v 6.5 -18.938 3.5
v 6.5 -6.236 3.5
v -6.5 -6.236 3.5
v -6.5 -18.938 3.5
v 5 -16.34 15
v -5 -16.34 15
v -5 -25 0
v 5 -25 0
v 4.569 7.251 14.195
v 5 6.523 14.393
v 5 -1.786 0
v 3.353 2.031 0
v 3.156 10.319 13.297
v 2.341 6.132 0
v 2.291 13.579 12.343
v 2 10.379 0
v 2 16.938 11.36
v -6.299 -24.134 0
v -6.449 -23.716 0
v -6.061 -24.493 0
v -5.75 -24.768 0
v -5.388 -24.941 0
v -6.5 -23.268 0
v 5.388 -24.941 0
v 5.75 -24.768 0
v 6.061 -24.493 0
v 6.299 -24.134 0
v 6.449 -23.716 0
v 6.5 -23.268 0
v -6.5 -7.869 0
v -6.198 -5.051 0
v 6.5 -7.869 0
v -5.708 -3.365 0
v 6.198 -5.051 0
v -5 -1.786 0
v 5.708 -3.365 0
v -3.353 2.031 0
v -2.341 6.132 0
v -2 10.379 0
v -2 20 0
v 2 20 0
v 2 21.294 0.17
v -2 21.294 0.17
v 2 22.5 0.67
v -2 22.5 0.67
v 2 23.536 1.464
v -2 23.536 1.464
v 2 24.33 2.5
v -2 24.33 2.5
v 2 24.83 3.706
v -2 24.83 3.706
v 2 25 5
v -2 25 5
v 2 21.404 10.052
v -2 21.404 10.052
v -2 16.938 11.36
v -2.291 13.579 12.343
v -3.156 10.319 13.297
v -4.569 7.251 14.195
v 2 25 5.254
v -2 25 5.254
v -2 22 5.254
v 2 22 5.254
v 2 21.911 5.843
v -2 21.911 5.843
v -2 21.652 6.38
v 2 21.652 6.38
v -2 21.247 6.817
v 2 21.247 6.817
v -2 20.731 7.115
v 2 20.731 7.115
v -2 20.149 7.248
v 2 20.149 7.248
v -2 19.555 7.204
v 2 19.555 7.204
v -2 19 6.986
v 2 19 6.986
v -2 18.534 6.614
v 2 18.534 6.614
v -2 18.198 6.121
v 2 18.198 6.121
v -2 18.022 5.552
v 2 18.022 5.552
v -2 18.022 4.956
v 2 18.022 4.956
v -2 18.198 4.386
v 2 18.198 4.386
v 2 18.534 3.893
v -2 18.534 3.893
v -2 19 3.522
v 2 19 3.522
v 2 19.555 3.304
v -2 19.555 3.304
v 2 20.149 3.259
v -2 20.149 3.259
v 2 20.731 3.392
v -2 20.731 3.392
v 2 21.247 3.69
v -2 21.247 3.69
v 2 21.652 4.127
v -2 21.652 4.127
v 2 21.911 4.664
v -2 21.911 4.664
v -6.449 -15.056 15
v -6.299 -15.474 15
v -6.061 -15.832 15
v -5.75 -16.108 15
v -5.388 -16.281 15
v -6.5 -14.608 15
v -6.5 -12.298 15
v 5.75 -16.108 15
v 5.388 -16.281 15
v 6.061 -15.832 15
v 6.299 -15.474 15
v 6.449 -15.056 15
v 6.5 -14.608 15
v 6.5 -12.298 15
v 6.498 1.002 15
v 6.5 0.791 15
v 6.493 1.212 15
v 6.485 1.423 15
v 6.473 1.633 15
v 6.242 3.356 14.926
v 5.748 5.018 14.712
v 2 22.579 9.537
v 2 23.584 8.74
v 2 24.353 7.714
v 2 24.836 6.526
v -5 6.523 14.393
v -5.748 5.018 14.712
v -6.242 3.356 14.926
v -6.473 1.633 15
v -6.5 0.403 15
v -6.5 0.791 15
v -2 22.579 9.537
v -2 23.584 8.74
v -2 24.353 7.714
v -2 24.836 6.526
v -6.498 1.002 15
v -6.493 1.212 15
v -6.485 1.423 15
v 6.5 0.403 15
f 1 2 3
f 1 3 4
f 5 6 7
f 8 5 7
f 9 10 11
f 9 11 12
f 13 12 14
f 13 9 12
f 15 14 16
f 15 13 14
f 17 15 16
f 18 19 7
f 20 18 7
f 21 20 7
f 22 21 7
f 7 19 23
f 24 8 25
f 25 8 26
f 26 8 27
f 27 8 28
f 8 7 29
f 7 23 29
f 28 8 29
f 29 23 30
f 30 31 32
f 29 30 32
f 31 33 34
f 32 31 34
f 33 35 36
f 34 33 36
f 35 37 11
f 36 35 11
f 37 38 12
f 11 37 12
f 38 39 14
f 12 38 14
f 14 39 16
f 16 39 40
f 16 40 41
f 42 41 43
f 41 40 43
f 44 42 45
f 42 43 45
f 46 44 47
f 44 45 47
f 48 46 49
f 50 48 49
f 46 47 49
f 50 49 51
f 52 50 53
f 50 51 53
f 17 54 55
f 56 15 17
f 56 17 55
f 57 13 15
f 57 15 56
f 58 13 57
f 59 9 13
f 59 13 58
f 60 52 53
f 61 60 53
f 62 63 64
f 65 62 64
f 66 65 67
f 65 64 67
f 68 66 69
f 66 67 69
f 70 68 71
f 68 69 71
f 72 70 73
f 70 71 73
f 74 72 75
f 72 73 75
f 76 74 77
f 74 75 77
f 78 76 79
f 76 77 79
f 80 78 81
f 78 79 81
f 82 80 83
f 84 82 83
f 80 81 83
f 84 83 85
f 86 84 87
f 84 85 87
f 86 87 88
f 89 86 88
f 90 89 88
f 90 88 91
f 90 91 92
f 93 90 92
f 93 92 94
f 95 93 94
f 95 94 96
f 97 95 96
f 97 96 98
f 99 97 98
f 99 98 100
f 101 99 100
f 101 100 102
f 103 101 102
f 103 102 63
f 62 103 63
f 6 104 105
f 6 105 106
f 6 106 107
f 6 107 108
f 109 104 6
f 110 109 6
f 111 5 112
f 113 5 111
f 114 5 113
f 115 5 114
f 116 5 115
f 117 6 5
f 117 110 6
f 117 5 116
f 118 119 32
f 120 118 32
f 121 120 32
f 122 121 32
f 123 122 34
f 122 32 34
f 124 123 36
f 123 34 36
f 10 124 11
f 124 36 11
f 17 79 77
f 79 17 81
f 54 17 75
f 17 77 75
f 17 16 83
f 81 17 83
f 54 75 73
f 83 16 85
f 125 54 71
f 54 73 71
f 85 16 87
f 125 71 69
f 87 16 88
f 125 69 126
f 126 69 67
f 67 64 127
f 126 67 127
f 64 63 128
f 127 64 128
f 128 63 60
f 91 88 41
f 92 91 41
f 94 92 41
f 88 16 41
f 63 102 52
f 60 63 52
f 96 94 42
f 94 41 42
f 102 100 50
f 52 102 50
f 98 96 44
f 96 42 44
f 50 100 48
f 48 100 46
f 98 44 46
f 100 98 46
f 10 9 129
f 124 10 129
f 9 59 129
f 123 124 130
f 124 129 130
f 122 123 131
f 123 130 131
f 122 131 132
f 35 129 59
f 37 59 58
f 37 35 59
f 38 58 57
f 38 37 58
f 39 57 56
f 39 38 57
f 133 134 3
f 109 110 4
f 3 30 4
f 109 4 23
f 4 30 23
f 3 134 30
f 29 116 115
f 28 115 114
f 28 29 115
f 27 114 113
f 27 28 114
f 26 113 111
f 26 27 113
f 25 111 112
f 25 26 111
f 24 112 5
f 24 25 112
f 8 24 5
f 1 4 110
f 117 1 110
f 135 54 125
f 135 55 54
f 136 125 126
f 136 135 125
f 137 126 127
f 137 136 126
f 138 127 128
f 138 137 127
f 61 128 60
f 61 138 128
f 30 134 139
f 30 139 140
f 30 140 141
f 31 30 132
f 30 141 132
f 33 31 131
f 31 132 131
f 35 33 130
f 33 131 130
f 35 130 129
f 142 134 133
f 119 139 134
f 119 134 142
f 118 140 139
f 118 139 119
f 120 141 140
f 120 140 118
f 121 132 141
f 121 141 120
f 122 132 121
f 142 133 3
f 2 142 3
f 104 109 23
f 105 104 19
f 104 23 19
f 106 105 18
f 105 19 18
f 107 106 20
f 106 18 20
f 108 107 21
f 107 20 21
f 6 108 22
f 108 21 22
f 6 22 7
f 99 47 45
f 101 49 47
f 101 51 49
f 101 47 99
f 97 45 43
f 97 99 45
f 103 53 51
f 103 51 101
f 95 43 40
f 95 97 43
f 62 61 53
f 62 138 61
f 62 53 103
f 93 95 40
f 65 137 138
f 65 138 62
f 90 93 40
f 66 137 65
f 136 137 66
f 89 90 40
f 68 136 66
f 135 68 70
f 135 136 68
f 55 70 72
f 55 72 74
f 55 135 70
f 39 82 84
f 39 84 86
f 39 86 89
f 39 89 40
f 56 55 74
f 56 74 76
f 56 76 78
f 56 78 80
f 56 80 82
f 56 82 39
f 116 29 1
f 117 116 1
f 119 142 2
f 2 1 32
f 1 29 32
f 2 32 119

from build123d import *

# Parameters (mm, degrees)
F1_DEPTH     = 15
F3_DEPTH     = 25
F4_DEPTH     = 4.5
F6_DEPTH     = 4.5
F7_T4_DEPTH  = 80.5166313745
F7_T10_DEPTH = 80.5166313745
F8_SIZE2     = 20.5
F8_SIZE      = 6
F9_R         = 1.5
F10_R        = 10
F11_R        = 20
F12_R        = 5
F13_R        = 2
F14_DEPTH    = 25


# Not quite as in the source:
# - a fillet or chamfer that OpenCascade refuses, or shapes differently, is made with other operations: its cross-section is extruded or revolved along the edge and cut away or added


with BuildPart() as f1:
    # F0 (on Top) → F1 (new body)
    with BuildSketch(Plane.XY):
        Polygon((-6.5, 12), (-6.5, -25), (6.5, -25), (6.5, 12), (2, 12), (2, 25), (-2, 25), (-2, 12), align=None)
    extrude(amount=F1_DEPTH)

    # F2 (on face) → F3 (cut)
    with BuildSketch(Plane(origin=(-6.5, 0, 0), x_dir=(0, -1, 0), z_dir=(-1, 0, 0))):
        Polygon((6.2361162513, 3.5), (18.9378221735, 3.5), (12.2982940778, 15), (-0.4034118443, 15), align=None)
        Polygon((25, 15), (16.3397459622, 15), (25, 0), align=None)
    extrude(amount=-F3_DEPTH, mode=Mode.SUBTRACT)

    # F2 (on face) → F4 (cut)
    with BuildSketch(Plane(origin=(-6.5, 0, 0), x_dir=(0, -1, 0), z_dir=(-1, 0, 0))):
        Polygon((4.2153903092, 0), (2.194664367, 3.5), (-4.4448637287, 15), (-12, 15), (-12, 0), align=None)
    extrude(amount=-F4_DEPTH, mode=Mode.SUBTRACT)

    # F5 (on face) → F6 (cut)
    with BuildSketch(Plane.YZ.offset(6.5)):
        Polygon((12, 15), (4.4448637287, 15), (-4.2153903092, 0), (12, 0), align=None)
    extrude(amount=-F6_DEPTH, mode=Mode.SUBTRACT)

    # F7: fillet of radius 20 on 2 edges, made by hand


with BuildPart() as f7_tool2:
    # F7_s3 → F7_t4 (new body)
    with BuildSketch(Plane(origin=(0, -16.852878402, -29.190041646), x_dir=(1, 0, 0), z_dir=(0, 0.5, 0.8660254038))):
        with BuildLine():
            ThreePointArc((-6.5, -3.6506350946), (-3.1585563186, 2.2803856327), (-2, 8.9885895652))
            Line((-2, 8.9885895652), (-2, -3.6506350946))
            Line((-2, -3.6506350946), (-6.5, -3.6506350946))
        make_face()
    extrude(amount=F7_T4_DEPTH)

    split(bisect_by=Plane.XY.offset(15), keep=Keep.BOTTOM)

    split(bisect_by=Plane.XY, keep=Keep.TOP)


with BuildPart() as f1_1:
    add(f1.part)

    # F7_t1: union F7_tool2
    add(f7_tool2.part)


with BuildPart() as f7_tool8:
    # F7_s9 → F7_t10 (new body)
    with BuildSketch(Plane(origin=(0, 23.4054372853, 40.5394065514), x_dir=(1, 0, 0), z_dir=(0, -0.5, -0.8660254038))):
        with BuildLine():
            ThreePointArc((6.5, 3.6506350946), (3.1585563186, -2.2803856327), (2, -8.9885895652))
            Line((2, -8.9885895652), (2, 3.6506350946))
            Line((2, 3.6506350946), (6.5, 3.6506350946))
        make_face()
    extrude(amount=F7_T10_DEPTH)

    split(bisect_by=Plane.XY, keep=Keep.TOP)

    split(bisect_by=Plane.XY.offset(15), keep=Keep.BOTTOM)


with BuildPart() as f1_2:
    add(f1_1.part)

    # F7_t7: union F7_tool8
    add(f7_tool8.part)

    # F8
    f8_edges = [f1_2.edges().sort_by_distance(p)[0] for p in [
        (0, 25, 15),
    ]]
    f8_side = f1_2.faces().sort_by_distance((0, 25, 7.5))[0]
    chamfer(f8_edges, length=F8_SIZE, length2=F8_SIZE2, reference=f8_side)

    # F9
    f9_edges = [f1_2.edges().sort_by_distance(p)[0] for p in [
        (-6.5, -20.669873, 7.5),
        (6.5, -20.669873, 7.5),
    ]]
    fillet(f9_edges, radius=F9_R)

    # F10
    f10_edges = [f1_2.edges().sort_by_distance(p)[0] for p in [
        (-6.5, 0.114737, 7.5),
        (6.5, 0.114737, 7.5),
    ]]
    fillet(f10_edges, radius=F10_R)

    # F11
    f11_edges = [f1_2.edges().sort_by_distance(p)[0] for p in [
        (0, 4.5, 15),
    ]]
    fillet(f11_edges, radius=F11_R)

    # F12
    f12_edges = [f1_2.edges().sort_by_distance(p)[0] for p in [
        (0, 25, 9),
        (0, 25, 0),
    ]]
    fillet(f12_edges, radius=F12_R)

    # F13 (on face) → F14 (cut)
    with BuildSketch(Plane.YZ.offset(2)):
        with Locations((20, 5.2536562529)):
            Circle(F13_R)
    extrude(amount=-F14_DEPTH, mode=Mode.SUBTRACT)


solid = f1_2.part
